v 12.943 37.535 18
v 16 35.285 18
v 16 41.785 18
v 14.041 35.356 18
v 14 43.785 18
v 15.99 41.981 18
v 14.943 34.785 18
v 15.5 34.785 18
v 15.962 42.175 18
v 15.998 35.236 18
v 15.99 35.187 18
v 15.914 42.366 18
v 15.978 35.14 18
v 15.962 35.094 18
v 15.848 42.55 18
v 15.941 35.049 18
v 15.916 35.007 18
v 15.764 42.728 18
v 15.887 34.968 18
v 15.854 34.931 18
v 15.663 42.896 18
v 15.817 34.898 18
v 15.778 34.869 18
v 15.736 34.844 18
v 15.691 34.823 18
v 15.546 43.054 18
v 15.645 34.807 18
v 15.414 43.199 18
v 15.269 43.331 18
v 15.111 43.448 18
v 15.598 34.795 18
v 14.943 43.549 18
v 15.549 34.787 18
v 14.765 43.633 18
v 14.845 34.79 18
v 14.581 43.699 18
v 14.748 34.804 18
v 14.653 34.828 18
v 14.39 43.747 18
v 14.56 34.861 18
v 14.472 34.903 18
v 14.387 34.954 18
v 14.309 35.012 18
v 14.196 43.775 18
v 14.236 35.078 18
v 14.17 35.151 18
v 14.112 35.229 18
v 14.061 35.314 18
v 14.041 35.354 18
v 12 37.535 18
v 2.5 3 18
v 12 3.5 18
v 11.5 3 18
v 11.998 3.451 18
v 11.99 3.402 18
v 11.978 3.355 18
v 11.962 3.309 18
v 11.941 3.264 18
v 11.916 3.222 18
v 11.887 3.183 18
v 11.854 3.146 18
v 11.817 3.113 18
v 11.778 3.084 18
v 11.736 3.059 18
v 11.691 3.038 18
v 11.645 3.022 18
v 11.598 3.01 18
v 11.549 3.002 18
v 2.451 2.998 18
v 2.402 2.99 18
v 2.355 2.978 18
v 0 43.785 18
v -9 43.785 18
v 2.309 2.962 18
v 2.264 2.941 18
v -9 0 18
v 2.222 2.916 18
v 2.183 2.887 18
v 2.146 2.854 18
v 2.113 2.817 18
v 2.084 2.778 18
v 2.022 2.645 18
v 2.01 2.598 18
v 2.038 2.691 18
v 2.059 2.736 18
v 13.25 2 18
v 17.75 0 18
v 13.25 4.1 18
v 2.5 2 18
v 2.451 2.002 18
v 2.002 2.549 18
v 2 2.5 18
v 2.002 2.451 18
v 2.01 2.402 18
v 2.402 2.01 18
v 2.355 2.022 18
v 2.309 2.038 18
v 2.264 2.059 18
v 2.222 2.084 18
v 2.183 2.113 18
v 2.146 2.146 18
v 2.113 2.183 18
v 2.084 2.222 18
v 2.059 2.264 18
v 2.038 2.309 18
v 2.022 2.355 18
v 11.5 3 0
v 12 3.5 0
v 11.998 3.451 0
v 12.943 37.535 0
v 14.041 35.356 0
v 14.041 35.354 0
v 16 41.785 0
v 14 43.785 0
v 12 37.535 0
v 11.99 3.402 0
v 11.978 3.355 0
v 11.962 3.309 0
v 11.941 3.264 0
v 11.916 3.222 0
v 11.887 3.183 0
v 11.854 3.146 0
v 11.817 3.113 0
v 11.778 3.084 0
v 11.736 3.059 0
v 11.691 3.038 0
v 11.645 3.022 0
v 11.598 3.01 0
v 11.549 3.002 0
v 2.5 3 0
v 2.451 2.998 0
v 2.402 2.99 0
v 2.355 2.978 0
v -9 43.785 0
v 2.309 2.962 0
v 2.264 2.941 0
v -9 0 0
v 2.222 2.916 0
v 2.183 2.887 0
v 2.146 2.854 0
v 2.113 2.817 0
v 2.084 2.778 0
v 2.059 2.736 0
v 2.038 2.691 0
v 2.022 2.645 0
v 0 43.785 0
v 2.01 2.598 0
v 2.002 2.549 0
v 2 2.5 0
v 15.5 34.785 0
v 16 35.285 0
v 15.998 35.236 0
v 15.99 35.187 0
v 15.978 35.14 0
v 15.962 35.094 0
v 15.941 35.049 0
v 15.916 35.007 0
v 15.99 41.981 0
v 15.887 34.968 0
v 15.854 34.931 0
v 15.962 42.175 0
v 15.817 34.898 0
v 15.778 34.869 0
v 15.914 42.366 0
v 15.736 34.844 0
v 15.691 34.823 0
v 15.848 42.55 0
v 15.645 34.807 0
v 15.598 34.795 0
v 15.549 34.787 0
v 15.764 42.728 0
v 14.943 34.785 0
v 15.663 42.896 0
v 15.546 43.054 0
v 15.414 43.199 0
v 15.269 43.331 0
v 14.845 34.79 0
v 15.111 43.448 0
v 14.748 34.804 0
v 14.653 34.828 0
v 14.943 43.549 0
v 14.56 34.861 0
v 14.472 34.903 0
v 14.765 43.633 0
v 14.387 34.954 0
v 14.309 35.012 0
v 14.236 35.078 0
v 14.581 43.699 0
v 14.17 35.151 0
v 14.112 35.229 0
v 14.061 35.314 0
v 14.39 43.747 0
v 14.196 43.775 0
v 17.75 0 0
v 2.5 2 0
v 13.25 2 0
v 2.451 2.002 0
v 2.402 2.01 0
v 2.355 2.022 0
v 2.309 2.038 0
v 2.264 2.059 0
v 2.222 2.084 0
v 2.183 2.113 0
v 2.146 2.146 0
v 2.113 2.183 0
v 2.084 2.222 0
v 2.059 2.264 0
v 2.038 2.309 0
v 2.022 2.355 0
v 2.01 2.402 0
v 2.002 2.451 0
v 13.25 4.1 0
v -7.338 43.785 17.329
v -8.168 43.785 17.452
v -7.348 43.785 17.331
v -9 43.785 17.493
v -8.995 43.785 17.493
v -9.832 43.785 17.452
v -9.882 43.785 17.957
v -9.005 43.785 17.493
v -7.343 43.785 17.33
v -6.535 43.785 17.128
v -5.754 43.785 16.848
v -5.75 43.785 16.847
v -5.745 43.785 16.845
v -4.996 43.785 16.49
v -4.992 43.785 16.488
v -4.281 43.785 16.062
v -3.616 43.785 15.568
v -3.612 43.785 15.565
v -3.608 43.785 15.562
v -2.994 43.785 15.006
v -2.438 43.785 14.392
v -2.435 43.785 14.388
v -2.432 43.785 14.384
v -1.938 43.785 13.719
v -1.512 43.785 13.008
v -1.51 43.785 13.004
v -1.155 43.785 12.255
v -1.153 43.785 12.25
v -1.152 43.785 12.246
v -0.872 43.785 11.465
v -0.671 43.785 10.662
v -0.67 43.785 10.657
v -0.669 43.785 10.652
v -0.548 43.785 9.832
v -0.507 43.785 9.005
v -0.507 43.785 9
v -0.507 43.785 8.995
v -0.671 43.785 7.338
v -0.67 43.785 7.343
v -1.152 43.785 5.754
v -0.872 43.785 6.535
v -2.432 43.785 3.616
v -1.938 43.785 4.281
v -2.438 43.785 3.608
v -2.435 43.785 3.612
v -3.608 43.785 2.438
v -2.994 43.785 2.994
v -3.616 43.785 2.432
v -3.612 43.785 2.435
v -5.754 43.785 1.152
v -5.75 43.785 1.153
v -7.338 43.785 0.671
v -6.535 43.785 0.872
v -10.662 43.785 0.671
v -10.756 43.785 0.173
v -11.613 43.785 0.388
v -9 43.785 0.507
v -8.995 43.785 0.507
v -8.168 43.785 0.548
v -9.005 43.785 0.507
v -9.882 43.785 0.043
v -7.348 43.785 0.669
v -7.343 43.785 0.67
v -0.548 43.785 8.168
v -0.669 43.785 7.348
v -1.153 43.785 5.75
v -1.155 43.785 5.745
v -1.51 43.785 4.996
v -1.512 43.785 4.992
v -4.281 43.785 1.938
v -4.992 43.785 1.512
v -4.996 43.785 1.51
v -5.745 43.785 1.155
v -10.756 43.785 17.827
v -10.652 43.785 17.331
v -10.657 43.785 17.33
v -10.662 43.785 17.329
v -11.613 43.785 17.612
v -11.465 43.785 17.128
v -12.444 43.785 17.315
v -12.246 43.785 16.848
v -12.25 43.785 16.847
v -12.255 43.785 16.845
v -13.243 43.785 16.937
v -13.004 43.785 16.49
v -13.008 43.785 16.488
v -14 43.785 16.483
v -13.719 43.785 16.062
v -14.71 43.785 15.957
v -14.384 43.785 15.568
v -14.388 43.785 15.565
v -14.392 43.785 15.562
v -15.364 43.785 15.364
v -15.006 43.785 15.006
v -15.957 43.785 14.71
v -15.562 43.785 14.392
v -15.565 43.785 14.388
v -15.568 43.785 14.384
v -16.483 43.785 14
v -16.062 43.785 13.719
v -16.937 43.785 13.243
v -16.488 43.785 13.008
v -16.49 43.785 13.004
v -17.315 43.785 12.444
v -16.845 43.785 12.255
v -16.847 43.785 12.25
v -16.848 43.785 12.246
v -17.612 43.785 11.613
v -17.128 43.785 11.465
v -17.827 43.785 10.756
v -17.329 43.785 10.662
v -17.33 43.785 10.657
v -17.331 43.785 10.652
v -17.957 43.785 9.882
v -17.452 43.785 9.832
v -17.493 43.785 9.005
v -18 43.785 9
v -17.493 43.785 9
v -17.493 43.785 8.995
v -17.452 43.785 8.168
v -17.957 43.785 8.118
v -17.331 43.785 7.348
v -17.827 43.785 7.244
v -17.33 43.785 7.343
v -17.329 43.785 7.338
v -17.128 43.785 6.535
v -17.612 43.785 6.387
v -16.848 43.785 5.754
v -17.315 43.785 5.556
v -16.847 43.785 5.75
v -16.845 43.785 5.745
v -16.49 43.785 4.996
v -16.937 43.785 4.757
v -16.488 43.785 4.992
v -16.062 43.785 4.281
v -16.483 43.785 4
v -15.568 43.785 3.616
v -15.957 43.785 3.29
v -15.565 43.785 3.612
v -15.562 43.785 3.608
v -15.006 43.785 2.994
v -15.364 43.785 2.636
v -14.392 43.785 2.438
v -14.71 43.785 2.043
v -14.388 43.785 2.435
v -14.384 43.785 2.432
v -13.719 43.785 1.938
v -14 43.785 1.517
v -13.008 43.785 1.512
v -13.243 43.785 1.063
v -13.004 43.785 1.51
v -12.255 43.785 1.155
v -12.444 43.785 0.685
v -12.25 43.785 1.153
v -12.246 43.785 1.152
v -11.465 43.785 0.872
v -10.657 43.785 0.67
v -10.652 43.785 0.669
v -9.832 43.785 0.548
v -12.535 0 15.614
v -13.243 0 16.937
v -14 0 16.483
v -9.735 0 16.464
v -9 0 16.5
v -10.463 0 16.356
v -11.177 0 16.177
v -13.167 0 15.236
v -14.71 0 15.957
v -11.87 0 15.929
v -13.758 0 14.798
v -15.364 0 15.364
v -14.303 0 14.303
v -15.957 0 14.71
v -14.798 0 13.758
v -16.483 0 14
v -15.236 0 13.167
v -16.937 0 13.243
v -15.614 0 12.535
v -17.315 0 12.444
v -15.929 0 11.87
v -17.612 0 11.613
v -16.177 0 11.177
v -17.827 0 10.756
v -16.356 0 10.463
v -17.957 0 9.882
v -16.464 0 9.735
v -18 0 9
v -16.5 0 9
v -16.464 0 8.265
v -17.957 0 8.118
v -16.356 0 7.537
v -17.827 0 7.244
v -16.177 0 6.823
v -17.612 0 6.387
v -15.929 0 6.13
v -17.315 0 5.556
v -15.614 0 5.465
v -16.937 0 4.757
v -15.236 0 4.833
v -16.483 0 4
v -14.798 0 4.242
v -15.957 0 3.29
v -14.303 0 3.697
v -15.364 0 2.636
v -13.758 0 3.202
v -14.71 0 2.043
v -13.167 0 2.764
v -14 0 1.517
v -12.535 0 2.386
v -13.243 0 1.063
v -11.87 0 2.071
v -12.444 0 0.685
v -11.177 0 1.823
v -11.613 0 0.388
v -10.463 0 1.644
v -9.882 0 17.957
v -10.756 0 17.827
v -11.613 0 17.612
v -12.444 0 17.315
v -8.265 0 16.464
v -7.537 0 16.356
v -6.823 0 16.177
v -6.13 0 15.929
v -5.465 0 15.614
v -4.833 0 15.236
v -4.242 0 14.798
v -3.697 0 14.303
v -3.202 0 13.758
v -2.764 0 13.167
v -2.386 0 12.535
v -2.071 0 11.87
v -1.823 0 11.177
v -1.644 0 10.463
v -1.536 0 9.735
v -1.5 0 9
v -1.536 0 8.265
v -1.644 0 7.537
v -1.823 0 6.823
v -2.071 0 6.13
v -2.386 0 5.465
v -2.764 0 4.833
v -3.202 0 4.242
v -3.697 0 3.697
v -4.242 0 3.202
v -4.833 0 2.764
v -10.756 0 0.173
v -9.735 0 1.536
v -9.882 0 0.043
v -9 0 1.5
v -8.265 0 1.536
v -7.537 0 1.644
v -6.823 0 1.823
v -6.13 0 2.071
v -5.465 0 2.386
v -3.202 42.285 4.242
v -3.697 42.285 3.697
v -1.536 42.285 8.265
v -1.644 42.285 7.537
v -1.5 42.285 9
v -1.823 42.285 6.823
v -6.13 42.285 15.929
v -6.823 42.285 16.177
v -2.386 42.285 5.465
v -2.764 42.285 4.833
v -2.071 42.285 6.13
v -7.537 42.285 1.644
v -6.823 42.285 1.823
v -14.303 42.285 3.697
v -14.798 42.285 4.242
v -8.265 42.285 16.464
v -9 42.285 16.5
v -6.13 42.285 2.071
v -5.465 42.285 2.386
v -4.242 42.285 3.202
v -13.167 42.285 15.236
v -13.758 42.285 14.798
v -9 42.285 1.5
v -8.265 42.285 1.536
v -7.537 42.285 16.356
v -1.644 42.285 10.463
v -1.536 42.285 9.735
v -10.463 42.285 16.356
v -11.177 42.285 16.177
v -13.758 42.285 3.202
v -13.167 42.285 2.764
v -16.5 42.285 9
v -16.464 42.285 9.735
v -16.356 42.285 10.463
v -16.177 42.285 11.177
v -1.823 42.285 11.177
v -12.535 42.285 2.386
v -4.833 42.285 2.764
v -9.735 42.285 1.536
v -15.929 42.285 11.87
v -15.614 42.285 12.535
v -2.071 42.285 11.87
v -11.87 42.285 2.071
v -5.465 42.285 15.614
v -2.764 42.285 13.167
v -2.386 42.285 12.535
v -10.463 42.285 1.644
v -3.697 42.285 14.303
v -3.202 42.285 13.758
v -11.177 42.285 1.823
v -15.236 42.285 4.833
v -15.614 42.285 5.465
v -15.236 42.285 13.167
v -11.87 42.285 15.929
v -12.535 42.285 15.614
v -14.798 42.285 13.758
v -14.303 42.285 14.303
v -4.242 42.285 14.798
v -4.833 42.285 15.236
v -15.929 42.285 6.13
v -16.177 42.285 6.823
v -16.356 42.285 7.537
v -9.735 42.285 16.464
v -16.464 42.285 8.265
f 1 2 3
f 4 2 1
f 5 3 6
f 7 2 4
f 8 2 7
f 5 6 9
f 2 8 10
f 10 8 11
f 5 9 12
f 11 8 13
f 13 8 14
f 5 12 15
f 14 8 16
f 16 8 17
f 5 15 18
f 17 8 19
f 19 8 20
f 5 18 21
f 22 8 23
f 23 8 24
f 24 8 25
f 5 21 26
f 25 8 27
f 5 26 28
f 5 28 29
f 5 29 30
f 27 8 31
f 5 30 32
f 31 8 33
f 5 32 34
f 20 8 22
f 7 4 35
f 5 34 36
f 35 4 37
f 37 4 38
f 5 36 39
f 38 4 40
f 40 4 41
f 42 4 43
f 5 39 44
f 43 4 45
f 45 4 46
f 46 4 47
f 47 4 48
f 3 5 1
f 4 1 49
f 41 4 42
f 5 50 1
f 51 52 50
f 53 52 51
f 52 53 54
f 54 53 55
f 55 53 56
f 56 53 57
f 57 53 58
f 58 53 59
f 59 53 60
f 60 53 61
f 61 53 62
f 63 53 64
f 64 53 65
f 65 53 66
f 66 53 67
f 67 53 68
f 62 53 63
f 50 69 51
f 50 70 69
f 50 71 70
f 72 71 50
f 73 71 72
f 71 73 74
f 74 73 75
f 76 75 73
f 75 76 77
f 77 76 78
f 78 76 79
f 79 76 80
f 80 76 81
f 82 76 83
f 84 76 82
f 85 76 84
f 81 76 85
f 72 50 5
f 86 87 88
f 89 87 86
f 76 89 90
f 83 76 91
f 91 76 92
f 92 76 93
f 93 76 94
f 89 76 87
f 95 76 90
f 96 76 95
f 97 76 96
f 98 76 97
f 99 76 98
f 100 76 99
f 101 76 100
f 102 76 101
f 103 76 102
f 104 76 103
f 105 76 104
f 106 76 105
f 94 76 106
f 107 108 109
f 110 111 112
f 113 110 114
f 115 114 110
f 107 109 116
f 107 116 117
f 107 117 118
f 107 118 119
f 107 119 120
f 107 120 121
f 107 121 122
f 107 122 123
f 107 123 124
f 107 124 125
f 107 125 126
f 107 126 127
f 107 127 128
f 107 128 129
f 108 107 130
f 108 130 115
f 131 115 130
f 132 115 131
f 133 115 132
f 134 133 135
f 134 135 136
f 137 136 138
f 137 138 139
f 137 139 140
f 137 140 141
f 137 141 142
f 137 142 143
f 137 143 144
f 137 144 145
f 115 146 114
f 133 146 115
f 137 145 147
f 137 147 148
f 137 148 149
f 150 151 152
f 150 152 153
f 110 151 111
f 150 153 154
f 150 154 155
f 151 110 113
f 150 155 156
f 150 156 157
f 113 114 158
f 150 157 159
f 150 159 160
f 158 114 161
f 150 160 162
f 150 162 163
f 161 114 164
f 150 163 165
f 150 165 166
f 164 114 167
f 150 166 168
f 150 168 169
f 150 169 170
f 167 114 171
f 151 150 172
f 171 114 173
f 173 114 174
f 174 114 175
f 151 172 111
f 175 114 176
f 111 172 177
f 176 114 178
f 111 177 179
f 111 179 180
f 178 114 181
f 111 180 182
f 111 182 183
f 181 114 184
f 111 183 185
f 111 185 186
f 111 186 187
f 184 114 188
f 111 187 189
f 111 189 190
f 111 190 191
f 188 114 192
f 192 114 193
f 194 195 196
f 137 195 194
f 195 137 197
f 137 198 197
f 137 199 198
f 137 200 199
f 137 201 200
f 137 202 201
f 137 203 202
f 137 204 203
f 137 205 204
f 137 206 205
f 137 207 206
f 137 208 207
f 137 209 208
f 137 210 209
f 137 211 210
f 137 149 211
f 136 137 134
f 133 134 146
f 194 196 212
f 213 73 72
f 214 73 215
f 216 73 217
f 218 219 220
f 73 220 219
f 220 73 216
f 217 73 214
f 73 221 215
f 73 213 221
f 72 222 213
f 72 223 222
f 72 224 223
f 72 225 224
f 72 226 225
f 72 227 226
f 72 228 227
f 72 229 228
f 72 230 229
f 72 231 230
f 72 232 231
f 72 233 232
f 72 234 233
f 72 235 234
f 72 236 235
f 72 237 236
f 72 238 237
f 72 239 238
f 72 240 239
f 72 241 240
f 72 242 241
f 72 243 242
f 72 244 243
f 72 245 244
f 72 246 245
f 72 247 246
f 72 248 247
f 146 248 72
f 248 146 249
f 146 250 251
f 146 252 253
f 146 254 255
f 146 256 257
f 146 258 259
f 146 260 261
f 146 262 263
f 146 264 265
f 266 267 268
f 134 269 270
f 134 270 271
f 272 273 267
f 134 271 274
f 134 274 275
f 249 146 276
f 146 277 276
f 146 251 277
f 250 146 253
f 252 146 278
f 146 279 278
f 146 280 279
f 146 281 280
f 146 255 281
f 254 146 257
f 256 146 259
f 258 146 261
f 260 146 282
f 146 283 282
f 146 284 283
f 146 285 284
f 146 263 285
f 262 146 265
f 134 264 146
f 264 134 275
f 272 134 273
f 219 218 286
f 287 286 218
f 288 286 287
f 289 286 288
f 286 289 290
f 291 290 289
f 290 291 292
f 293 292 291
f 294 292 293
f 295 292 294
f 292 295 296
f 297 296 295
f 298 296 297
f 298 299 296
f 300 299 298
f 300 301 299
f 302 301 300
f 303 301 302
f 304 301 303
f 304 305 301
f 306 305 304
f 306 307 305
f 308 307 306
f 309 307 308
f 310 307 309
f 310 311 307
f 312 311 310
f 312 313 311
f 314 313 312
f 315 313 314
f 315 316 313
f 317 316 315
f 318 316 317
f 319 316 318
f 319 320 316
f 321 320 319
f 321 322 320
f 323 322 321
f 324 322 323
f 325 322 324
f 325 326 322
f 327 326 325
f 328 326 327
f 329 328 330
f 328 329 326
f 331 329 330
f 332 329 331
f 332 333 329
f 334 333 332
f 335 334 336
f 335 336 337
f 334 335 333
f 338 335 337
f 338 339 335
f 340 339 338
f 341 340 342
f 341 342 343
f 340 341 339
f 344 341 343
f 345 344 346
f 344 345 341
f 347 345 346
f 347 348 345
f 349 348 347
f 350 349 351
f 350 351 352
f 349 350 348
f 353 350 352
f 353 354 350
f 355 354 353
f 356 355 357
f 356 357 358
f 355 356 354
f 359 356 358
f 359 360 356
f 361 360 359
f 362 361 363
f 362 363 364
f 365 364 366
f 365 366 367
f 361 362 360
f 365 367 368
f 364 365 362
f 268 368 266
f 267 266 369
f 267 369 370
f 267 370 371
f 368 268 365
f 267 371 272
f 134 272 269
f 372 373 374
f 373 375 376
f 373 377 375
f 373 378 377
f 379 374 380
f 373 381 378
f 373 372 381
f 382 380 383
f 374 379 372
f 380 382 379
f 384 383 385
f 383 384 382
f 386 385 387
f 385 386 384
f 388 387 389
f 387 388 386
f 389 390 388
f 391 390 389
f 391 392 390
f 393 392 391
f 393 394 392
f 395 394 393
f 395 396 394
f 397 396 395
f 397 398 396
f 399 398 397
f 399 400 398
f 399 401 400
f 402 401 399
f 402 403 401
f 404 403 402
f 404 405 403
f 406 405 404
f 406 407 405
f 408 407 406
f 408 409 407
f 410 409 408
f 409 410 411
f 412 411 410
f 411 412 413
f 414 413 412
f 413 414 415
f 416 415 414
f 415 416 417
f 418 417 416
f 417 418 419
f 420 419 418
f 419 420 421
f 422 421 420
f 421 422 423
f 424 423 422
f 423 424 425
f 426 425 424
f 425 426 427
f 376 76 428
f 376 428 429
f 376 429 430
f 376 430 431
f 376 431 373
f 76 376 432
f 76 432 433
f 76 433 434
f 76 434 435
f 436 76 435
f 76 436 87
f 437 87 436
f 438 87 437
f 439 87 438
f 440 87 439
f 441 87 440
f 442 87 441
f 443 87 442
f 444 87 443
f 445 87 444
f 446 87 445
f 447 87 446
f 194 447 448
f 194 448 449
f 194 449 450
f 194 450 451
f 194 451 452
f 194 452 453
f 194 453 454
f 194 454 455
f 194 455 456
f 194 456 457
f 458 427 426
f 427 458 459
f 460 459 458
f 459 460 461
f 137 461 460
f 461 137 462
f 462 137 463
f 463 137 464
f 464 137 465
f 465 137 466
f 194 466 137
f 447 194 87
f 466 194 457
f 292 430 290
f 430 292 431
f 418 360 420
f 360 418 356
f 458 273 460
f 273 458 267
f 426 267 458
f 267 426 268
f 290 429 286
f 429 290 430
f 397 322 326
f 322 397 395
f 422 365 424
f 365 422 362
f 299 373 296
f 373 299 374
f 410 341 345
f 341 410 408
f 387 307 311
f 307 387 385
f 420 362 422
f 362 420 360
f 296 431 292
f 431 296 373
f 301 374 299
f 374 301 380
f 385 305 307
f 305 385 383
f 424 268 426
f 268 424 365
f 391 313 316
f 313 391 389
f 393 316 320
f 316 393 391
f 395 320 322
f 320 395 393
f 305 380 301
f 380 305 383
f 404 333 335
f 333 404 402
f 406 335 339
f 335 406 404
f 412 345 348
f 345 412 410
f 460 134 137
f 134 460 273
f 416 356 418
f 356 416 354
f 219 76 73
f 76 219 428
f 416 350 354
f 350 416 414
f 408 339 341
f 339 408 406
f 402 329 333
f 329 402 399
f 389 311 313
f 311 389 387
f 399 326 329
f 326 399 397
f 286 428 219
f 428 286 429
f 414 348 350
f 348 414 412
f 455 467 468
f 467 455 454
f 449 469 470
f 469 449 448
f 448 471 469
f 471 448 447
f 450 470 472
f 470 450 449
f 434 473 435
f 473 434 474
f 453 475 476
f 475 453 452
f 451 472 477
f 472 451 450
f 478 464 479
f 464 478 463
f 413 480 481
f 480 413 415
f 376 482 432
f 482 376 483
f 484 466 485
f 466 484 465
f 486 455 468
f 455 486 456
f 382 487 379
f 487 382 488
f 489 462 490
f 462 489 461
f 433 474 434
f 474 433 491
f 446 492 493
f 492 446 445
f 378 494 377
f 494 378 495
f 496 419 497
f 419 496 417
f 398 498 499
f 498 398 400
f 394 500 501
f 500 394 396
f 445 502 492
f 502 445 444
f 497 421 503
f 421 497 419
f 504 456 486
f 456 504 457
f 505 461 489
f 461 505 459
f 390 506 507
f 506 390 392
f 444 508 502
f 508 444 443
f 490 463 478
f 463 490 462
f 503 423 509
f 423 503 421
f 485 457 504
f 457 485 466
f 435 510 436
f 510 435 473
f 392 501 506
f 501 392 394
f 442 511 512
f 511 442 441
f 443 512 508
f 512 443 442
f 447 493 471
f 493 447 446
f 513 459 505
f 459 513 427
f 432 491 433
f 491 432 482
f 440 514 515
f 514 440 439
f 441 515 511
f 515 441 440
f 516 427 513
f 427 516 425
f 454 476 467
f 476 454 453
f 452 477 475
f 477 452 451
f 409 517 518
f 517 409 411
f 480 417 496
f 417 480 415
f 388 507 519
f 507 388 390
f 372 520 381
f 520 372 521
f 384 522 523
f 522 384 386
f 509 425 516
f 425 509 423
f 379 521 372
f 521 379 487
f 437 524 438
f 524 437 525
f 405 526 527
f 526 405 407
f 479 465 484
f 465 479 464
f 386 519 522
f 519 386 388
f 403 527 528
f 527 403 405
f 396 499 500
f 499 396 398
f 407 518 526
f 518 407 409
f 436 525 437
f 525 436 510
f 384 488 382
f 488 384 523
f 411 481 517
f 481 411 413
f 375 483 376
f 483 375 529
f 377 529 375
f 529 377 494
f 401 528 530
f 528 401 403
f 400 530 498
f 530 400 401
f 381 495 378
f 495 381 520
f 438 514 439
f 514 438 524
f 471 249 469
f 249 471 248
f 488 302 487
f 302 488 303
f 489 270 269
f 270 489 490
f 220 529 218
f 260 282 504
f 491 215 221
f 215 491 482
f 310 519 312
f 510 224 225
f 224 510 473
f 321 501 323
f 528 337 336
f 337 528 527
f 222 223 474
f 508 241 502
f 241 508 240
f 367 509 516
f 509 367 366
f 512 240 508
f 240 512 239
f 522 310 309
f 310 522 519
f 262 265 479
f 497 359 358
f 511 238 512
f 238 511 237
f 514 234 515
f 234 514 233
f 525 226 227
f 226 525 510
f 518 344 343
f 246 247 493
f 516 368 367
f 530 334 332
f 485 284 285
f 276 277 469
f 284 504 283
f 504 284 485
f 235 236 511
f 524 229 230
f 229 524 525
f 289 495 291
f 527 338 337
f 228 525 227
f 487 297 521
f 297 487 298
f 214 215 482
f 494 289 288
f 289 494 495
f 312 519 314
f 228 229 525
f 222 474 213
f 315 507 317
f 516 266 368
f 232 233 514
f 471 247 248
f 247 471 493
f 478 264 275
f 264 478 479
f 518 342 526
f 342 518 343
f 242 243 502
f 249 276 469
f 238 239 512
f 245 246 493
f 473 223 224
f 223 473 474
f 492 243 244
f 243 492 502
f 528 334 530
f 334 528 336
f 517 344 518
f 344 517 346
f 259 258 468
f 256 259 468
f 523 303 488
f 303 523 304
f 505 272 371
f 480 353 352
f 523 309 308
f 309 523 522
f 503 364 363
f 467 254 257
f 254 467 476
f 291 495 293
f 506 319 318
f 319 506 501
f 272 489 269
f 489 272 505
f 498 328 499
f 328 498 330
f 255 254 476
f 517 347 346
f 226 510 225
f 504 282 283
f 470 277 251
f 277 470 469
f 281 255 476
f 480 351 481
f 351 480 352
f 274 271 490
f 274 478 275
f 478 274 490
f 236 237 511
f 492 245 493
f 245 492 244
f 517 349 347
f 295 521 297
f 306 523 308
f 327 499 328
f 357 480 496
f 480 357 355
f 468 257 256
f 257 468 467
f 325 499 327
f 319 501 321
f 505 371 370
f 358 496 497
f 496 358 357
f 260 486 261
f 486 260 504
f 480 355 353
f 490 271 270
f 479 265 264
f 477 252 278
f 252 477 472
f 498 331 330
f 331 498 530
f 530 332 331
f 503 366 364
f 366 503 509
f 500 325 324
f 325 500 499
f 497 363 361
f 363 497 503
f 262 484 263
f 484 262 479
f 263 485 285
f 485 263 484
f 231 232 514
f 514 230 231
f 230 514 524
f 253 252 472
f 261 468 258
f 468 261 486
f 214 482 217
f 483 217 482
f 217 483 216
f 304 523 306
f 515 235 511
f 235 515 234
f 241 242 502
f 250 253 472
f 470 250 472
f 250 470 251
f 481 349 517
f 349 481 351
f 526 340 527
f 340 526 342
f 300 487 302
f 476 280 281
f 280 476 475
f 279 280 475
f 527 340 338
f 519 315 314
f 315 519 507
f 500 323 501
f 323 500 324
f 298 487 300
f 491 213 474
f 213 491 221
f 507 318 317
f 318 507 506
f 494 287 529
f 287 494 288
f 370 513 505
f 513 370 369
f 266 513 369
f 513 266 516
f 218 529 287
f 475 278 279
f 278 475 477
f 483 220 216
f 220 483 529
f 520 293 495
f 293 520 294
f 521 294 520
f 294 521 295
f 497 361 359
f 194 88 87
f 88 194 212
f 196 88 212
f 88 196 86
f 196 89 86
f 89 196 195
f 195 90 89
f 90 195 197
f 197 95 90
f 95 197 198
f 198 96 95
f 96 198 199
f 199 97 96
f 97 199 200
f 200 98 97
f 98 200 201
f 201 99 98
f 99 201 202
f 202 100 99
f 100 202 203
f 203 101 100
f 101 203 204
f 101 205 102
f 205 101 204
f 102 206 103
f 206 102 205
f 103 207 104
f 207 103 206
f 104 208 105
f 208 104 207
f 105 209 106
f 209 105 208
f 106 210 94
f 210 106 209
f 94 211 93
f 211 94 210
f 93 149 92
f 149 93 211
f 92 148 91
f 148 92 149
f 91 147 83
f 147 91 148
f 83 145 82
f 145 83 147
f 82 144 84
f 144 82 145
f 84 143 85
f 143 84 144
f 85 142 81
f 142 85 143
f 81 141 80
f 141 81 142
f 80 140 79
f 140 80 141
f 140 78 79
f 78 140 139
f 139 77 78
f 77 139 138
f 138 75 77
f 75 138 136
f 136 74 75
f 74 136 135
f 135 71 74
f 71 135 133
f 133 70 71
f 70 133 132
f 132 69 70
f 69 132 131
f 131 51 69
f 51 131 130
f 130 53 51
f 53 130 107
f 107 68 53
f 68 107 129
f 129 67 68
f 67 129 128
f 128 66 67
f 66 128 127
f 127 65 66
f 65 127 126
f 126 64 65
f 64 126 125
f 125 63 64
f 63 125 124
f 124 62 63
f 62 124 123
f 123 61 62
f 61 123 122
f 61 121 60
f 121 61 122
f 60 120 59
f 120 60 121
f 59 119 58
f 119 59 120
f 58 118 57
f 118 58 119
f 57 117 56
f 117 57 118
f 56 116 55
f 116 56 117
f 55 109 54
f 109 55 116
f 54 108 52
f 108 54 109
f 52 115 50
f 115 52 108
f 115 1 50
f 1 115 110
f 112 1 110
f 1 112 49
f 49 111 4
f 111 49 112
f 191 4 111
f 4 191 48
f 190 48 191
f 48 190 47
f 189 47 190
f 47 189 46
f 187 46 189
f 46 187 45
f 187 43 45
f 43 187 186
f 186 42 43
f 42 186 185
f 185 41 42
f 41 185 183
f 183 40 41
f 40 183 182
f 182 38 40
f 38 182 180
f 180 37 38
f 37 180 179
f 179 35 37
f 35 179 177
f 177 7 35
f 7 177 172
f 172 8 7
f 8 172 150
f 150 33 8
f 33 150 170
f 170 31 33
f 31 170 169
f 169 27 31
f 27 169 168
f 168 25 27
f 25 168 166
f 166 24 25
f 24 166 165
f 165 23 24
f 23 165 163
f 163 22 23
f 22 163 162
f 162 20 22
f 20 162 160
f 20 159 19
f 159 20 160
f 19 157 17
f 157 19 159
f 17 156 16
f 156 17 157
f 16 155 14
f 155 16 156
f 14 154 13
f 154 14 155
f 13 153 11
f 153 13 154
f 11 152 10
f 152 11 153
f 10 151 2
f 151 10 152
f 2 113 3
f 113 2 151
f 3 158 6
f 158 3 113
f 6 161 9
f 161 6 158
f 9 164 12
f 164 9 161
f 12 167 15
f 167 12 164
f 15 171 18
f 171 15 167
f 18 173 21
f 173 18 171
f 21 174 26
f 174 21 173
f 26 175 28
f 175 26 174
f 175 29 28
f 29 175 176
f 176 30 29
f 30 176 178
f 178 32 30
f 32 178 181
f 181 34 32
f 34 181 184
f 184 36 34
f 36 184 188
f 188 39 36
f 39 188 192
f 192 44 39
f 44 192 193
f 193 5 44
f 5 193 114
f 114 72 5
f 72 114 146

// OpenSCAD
/*
This software is licensed by Green Ellipsis Inc. under the GNU LESSER GENERAL PUBLIC LICENSE, Version 3
https://www.gnu.org/licenses/gpl.html

TODO: 
* Add multiples
* Add recyling symbol
* engrave image
* Add writing/labeling
* emboss dimensions
* trim the bottom as well as the top.
* add square clips
* add tight fit
* add screw holes through body
* Add rectangular cutouts
* Add option for spring release.
* Make DIN_clip a library function.

*
* Version 0.25 release notes
* Make wall thickness a function of dim_1.
* frugal cutout now of function of body_height instead of wall_thickness
* 
* Version 0.3 release notes
* Cleaned up parameters. 
* Added chamfer to bottom if frugal is checked.
* Created JSON file for presets (Requires OpenSCAD 2017 or later).
*
*/
use <MCAD/2Dshapes.scad>

/* [Customize] */
// radius of the top
dimension_1 = 7.5; // [1:100]
// radius of the bottom
dimension_2 = 7.5; // [1:0.1:100]
// radius of the chamfer around the top
dimension_3 = 8.5; // [1:0.1:100]
// length of the body of the DIN rail clip, front to back
body_length = 12; //[2:0.1:100]
// remove some material?
frugal = false;
// include a pull tab to release clip?
release_tab = false;

/* [Advanced] */
// bottom clip length
clip_length = 20; //[3:0.1:100]
// distance from back
release_tab_position=7.5; //[3:0.1:100]
// curvature of release tab
release_tab_radius = 10; //[5:100]
// length of release tab, in degrees
release_tab_arc = 90; //[5:180]

// Height of the snap tab on the bottom clip
bottom_tab_height = 4.1;

// wall thickness as a function of dimension1
wall_thickness_percent = 20;

/* [Hidden] */
// model parameters that shouldn't be messed with
bottom_clip_height=3;
clip_gap = 1;
top_clip_height = 9;
body_height = 43.785;
frugal_fraction = 0.8; // how much of the body to cut away;
lipHeight = body_height*(1-frugal_fraction)/2;


// rendering parameters
$fn=64;
EPSILON = 0.005;

// calculated parameters
clip_thickness=bottom_clip_height-clip_gap;
dimension1 = dimension_1;
dimension2 = min(dimension_1, dimension_2);
dimension3 = dimension_3;
wall_thickness = dimension1*wall_thickness_percent/100;
thing_width = (dimension1+wall_thickness)*2;

/* conventions:
* Each feature is created in a module.
* Features are aligned with bottom left at 0,0.
*/

module top_clip_2D(clip_style = "straight") {
    top_clip_width = 4;
    tab_height = 2.75;
    if (clip_style == "straight") {
        // TODO
        square([top_clip_width,top_clip_height]);
    } else { // clip_style = "angled"
        //square([6,9]);
        translate([0,tab_height,0]) 
        complexRoundSquare(size=[top_clip_width,top_clip_height-tab_height],rads1=[0,0], rads2=[0.0,0.0], rads3=[2,2], rads4=[0,0], center=false);
        x_offset = 1+1.943-1;
        translate([x_offset,0,0]) 
            complexRoundSquare(size=[top_clip_width-x_offset,tab_height],rads1=[1,1], rads2=[0.5,0.5], center=false);
        polygon(points=[[x_offset+(1-0.902),1-0.431],[x_offset,tab_height],[x_offset-1,tab_height]], paths=[[0,1,2]]);
    }
}

//body
module body_2D() {
    translate([0,0,0]) 
        complexRoundSquare(size=[body_length,body_height-bottom_clip_height],rads2=[0.5,0.5], center=false);
}

// release tab
module release_tab() {
    release_tab_height = sin(release_tab_arc/2)*release_tab_radius*2;
    release_tab_width = cos(release_tab_arc/2)*release_tab_radius;
    translate([release_tab_radius, release_tab_height/2,0])
    difference() 
    {
        union() {
            pieSlice(release_tab_radius,180-release_tab_arc/2,180+release_tab_arc/2);
            translate([-release_tab_radius,0,0]) square([release_tab_radius, release_tab_height/2]);
        }
        circle(release_tab_radius-clip_thickness); 
    }
}

// bottom clip
module bottom_clip_2D() {
    tab_width = 4.5;
    tab_gap = 1.25;
    bottom_clip_width=min(body_length, clip_length);
    difference() {
        square([bottom_clip_width+tab_gap, bottom_clip_height]);
        translate([clip_thickness,clip_thickness,0]) 
            complexRoundSquare(size=[bottom_clip_width-clip_thickness+tab_gap,clip_gap],rads1=[clip_gap/2,clip_gap/2],rads4=[clip_gap/2,clip_gap/2], center=false);
    }
    polygon(points=[[bottom_clip_width+tab_gap,0],[bottom_clip_width+tab_gap+tab_width,0],[bottom_clip_width+tab_gap,bottom_tab_height]], paths=[[0,1,2]]);
    // add release tab
    if (release_tab) {
        translate([max(0,bottom_clip_width-release_tab_position),-2*sin(release_tab_arc/2)*release_tab_radius+clip_thickness,0]) 
            release_tab();
    }
}

module DIN_clip_2D() {
    translate([body_length,body_height-top_clip_height,0]) top_clip_2D(clip_style="angled");
    translate([0,bottom_clip_height,0]) 
        body_2D();
    translate([max(0, body_length-clip_length),0,0])
        bottom_clip_2D();
}

module DIN_clip(width = 10) {
    linear_extrude(width)
        DIN_clip_2D();
/*
    // Shouldn't extrude on the side--it will interfere with its neighbors.
    str1 = str(dimension1*2);
    str2 = str(dimension2*2);
    textHeight = 4;
    translate([2,body_height-2,width]) write(str1,rotate=90, h= textHeight);
    translate([2,len(str2)*textHeight+bottom_clip_height,width]) write(str2,rotate=90, h=textHeight);
*/
}

// Cut a chamfer into the bottom of the frugal cut.
// Scale the chamfer to the top chamfer.
// Maximum chamfer size is dimension1, equal to no chamfer at all.
module bottom_chamfer() {
    bottomChamferRadius = min(dimension1,dimension2*(dimension3/dimension1));
    echo("bottomChamferRadius",bottomChamferRadius);
    // Create a cone whose bottom radius is dimension3,
    // whose radius at bottomLipZ is bottomChamferRadius,
    // and whose maxiumum radius is bodyWidth;
    height=sqrt(2)*(dimension1 - dimension2);
    z = lipHeight-sqrt(2)*(bottomChamferRadius - dimension2);
    undercutZ = height+z-EPSILON;
    undercutHeight = body_height/2-undercutZ+EPSILON*2;
    rotate([-90,0,0]) {
        // cut the chamfer using a cone
        translate([thing_width/2,-thing_width/2,z])
            cylinder(h=height, r1=dimension2, r2=dimension1);
        // clear out the undercut
        translate([thing_width/2,-thing_width/2,undercutZ])
            cylinder(h=undercutHeight, r=dimension1);
    }
}

// hole thing
module hole_thing(radius = 7.5, leadin_radius, bottom_radius, frugal=false) {
    leadin_r = (leadin_radius == undef ? radius*1.1 : leadin_radius);
    bottom_r = (bottom_radius == undef ? radius : bottom_radius);
    bottom_width = (bottom_r + wall_thickness)*2;
    echo(bottom_radius);
    echo(bottom_r);
    difference () 
    {
        union() {
            // extrude a cube for the close half of the body
            translate([thing_width/2,0,0]) cube([thing_width/2, body_height, thing_width]);
            // extrude a cylinder for the far half of the body
            rotate([-90,0,0]) 
                translate([thing_width/2,-thing_width/2]) 
                    cylinder(r1=bottom_width/2, r2=thing_width/2, h=body_height, center=false);
        }
        // cut a cone
        rotate([-90,0,0]) 
            translate([thing_width/2,-thing_width/2,-EPSILON]) {
                cylinder(h = body_height+2*EPSILON, r1 = bottom_r, r2 = radius, center=false);
                //cut the leadin
                translate([0,0,body_height-wall_thickness+EPSILON])
                    cylinder(h = wall_thickness+EPSILON*2, r1=radius, r2=leadin_radius, center=false);
            }
        if (frugal) {
            // cut the midsection out
            cut_radius = (body_height*frugal_fraction)/2;
            translate([0,body_height/2,-EPSILON])
                resize([thing_width*2,cut_radius*2,thing_width+EPSILON*2]) 
                    cylinder(center=false);
                //cube([thing_width/2,body_height-wall_thickness*6,thing_width+EPSILON*2]);
            bottom_chamfer();
        }
    }
}
/*
*/
DIN_clip(thing_width);
// build the thing in the -x area
translate([-thing_width, 0,0]) hole_thing(dimension1,dimension3,dimension2,frugal=frugal);
